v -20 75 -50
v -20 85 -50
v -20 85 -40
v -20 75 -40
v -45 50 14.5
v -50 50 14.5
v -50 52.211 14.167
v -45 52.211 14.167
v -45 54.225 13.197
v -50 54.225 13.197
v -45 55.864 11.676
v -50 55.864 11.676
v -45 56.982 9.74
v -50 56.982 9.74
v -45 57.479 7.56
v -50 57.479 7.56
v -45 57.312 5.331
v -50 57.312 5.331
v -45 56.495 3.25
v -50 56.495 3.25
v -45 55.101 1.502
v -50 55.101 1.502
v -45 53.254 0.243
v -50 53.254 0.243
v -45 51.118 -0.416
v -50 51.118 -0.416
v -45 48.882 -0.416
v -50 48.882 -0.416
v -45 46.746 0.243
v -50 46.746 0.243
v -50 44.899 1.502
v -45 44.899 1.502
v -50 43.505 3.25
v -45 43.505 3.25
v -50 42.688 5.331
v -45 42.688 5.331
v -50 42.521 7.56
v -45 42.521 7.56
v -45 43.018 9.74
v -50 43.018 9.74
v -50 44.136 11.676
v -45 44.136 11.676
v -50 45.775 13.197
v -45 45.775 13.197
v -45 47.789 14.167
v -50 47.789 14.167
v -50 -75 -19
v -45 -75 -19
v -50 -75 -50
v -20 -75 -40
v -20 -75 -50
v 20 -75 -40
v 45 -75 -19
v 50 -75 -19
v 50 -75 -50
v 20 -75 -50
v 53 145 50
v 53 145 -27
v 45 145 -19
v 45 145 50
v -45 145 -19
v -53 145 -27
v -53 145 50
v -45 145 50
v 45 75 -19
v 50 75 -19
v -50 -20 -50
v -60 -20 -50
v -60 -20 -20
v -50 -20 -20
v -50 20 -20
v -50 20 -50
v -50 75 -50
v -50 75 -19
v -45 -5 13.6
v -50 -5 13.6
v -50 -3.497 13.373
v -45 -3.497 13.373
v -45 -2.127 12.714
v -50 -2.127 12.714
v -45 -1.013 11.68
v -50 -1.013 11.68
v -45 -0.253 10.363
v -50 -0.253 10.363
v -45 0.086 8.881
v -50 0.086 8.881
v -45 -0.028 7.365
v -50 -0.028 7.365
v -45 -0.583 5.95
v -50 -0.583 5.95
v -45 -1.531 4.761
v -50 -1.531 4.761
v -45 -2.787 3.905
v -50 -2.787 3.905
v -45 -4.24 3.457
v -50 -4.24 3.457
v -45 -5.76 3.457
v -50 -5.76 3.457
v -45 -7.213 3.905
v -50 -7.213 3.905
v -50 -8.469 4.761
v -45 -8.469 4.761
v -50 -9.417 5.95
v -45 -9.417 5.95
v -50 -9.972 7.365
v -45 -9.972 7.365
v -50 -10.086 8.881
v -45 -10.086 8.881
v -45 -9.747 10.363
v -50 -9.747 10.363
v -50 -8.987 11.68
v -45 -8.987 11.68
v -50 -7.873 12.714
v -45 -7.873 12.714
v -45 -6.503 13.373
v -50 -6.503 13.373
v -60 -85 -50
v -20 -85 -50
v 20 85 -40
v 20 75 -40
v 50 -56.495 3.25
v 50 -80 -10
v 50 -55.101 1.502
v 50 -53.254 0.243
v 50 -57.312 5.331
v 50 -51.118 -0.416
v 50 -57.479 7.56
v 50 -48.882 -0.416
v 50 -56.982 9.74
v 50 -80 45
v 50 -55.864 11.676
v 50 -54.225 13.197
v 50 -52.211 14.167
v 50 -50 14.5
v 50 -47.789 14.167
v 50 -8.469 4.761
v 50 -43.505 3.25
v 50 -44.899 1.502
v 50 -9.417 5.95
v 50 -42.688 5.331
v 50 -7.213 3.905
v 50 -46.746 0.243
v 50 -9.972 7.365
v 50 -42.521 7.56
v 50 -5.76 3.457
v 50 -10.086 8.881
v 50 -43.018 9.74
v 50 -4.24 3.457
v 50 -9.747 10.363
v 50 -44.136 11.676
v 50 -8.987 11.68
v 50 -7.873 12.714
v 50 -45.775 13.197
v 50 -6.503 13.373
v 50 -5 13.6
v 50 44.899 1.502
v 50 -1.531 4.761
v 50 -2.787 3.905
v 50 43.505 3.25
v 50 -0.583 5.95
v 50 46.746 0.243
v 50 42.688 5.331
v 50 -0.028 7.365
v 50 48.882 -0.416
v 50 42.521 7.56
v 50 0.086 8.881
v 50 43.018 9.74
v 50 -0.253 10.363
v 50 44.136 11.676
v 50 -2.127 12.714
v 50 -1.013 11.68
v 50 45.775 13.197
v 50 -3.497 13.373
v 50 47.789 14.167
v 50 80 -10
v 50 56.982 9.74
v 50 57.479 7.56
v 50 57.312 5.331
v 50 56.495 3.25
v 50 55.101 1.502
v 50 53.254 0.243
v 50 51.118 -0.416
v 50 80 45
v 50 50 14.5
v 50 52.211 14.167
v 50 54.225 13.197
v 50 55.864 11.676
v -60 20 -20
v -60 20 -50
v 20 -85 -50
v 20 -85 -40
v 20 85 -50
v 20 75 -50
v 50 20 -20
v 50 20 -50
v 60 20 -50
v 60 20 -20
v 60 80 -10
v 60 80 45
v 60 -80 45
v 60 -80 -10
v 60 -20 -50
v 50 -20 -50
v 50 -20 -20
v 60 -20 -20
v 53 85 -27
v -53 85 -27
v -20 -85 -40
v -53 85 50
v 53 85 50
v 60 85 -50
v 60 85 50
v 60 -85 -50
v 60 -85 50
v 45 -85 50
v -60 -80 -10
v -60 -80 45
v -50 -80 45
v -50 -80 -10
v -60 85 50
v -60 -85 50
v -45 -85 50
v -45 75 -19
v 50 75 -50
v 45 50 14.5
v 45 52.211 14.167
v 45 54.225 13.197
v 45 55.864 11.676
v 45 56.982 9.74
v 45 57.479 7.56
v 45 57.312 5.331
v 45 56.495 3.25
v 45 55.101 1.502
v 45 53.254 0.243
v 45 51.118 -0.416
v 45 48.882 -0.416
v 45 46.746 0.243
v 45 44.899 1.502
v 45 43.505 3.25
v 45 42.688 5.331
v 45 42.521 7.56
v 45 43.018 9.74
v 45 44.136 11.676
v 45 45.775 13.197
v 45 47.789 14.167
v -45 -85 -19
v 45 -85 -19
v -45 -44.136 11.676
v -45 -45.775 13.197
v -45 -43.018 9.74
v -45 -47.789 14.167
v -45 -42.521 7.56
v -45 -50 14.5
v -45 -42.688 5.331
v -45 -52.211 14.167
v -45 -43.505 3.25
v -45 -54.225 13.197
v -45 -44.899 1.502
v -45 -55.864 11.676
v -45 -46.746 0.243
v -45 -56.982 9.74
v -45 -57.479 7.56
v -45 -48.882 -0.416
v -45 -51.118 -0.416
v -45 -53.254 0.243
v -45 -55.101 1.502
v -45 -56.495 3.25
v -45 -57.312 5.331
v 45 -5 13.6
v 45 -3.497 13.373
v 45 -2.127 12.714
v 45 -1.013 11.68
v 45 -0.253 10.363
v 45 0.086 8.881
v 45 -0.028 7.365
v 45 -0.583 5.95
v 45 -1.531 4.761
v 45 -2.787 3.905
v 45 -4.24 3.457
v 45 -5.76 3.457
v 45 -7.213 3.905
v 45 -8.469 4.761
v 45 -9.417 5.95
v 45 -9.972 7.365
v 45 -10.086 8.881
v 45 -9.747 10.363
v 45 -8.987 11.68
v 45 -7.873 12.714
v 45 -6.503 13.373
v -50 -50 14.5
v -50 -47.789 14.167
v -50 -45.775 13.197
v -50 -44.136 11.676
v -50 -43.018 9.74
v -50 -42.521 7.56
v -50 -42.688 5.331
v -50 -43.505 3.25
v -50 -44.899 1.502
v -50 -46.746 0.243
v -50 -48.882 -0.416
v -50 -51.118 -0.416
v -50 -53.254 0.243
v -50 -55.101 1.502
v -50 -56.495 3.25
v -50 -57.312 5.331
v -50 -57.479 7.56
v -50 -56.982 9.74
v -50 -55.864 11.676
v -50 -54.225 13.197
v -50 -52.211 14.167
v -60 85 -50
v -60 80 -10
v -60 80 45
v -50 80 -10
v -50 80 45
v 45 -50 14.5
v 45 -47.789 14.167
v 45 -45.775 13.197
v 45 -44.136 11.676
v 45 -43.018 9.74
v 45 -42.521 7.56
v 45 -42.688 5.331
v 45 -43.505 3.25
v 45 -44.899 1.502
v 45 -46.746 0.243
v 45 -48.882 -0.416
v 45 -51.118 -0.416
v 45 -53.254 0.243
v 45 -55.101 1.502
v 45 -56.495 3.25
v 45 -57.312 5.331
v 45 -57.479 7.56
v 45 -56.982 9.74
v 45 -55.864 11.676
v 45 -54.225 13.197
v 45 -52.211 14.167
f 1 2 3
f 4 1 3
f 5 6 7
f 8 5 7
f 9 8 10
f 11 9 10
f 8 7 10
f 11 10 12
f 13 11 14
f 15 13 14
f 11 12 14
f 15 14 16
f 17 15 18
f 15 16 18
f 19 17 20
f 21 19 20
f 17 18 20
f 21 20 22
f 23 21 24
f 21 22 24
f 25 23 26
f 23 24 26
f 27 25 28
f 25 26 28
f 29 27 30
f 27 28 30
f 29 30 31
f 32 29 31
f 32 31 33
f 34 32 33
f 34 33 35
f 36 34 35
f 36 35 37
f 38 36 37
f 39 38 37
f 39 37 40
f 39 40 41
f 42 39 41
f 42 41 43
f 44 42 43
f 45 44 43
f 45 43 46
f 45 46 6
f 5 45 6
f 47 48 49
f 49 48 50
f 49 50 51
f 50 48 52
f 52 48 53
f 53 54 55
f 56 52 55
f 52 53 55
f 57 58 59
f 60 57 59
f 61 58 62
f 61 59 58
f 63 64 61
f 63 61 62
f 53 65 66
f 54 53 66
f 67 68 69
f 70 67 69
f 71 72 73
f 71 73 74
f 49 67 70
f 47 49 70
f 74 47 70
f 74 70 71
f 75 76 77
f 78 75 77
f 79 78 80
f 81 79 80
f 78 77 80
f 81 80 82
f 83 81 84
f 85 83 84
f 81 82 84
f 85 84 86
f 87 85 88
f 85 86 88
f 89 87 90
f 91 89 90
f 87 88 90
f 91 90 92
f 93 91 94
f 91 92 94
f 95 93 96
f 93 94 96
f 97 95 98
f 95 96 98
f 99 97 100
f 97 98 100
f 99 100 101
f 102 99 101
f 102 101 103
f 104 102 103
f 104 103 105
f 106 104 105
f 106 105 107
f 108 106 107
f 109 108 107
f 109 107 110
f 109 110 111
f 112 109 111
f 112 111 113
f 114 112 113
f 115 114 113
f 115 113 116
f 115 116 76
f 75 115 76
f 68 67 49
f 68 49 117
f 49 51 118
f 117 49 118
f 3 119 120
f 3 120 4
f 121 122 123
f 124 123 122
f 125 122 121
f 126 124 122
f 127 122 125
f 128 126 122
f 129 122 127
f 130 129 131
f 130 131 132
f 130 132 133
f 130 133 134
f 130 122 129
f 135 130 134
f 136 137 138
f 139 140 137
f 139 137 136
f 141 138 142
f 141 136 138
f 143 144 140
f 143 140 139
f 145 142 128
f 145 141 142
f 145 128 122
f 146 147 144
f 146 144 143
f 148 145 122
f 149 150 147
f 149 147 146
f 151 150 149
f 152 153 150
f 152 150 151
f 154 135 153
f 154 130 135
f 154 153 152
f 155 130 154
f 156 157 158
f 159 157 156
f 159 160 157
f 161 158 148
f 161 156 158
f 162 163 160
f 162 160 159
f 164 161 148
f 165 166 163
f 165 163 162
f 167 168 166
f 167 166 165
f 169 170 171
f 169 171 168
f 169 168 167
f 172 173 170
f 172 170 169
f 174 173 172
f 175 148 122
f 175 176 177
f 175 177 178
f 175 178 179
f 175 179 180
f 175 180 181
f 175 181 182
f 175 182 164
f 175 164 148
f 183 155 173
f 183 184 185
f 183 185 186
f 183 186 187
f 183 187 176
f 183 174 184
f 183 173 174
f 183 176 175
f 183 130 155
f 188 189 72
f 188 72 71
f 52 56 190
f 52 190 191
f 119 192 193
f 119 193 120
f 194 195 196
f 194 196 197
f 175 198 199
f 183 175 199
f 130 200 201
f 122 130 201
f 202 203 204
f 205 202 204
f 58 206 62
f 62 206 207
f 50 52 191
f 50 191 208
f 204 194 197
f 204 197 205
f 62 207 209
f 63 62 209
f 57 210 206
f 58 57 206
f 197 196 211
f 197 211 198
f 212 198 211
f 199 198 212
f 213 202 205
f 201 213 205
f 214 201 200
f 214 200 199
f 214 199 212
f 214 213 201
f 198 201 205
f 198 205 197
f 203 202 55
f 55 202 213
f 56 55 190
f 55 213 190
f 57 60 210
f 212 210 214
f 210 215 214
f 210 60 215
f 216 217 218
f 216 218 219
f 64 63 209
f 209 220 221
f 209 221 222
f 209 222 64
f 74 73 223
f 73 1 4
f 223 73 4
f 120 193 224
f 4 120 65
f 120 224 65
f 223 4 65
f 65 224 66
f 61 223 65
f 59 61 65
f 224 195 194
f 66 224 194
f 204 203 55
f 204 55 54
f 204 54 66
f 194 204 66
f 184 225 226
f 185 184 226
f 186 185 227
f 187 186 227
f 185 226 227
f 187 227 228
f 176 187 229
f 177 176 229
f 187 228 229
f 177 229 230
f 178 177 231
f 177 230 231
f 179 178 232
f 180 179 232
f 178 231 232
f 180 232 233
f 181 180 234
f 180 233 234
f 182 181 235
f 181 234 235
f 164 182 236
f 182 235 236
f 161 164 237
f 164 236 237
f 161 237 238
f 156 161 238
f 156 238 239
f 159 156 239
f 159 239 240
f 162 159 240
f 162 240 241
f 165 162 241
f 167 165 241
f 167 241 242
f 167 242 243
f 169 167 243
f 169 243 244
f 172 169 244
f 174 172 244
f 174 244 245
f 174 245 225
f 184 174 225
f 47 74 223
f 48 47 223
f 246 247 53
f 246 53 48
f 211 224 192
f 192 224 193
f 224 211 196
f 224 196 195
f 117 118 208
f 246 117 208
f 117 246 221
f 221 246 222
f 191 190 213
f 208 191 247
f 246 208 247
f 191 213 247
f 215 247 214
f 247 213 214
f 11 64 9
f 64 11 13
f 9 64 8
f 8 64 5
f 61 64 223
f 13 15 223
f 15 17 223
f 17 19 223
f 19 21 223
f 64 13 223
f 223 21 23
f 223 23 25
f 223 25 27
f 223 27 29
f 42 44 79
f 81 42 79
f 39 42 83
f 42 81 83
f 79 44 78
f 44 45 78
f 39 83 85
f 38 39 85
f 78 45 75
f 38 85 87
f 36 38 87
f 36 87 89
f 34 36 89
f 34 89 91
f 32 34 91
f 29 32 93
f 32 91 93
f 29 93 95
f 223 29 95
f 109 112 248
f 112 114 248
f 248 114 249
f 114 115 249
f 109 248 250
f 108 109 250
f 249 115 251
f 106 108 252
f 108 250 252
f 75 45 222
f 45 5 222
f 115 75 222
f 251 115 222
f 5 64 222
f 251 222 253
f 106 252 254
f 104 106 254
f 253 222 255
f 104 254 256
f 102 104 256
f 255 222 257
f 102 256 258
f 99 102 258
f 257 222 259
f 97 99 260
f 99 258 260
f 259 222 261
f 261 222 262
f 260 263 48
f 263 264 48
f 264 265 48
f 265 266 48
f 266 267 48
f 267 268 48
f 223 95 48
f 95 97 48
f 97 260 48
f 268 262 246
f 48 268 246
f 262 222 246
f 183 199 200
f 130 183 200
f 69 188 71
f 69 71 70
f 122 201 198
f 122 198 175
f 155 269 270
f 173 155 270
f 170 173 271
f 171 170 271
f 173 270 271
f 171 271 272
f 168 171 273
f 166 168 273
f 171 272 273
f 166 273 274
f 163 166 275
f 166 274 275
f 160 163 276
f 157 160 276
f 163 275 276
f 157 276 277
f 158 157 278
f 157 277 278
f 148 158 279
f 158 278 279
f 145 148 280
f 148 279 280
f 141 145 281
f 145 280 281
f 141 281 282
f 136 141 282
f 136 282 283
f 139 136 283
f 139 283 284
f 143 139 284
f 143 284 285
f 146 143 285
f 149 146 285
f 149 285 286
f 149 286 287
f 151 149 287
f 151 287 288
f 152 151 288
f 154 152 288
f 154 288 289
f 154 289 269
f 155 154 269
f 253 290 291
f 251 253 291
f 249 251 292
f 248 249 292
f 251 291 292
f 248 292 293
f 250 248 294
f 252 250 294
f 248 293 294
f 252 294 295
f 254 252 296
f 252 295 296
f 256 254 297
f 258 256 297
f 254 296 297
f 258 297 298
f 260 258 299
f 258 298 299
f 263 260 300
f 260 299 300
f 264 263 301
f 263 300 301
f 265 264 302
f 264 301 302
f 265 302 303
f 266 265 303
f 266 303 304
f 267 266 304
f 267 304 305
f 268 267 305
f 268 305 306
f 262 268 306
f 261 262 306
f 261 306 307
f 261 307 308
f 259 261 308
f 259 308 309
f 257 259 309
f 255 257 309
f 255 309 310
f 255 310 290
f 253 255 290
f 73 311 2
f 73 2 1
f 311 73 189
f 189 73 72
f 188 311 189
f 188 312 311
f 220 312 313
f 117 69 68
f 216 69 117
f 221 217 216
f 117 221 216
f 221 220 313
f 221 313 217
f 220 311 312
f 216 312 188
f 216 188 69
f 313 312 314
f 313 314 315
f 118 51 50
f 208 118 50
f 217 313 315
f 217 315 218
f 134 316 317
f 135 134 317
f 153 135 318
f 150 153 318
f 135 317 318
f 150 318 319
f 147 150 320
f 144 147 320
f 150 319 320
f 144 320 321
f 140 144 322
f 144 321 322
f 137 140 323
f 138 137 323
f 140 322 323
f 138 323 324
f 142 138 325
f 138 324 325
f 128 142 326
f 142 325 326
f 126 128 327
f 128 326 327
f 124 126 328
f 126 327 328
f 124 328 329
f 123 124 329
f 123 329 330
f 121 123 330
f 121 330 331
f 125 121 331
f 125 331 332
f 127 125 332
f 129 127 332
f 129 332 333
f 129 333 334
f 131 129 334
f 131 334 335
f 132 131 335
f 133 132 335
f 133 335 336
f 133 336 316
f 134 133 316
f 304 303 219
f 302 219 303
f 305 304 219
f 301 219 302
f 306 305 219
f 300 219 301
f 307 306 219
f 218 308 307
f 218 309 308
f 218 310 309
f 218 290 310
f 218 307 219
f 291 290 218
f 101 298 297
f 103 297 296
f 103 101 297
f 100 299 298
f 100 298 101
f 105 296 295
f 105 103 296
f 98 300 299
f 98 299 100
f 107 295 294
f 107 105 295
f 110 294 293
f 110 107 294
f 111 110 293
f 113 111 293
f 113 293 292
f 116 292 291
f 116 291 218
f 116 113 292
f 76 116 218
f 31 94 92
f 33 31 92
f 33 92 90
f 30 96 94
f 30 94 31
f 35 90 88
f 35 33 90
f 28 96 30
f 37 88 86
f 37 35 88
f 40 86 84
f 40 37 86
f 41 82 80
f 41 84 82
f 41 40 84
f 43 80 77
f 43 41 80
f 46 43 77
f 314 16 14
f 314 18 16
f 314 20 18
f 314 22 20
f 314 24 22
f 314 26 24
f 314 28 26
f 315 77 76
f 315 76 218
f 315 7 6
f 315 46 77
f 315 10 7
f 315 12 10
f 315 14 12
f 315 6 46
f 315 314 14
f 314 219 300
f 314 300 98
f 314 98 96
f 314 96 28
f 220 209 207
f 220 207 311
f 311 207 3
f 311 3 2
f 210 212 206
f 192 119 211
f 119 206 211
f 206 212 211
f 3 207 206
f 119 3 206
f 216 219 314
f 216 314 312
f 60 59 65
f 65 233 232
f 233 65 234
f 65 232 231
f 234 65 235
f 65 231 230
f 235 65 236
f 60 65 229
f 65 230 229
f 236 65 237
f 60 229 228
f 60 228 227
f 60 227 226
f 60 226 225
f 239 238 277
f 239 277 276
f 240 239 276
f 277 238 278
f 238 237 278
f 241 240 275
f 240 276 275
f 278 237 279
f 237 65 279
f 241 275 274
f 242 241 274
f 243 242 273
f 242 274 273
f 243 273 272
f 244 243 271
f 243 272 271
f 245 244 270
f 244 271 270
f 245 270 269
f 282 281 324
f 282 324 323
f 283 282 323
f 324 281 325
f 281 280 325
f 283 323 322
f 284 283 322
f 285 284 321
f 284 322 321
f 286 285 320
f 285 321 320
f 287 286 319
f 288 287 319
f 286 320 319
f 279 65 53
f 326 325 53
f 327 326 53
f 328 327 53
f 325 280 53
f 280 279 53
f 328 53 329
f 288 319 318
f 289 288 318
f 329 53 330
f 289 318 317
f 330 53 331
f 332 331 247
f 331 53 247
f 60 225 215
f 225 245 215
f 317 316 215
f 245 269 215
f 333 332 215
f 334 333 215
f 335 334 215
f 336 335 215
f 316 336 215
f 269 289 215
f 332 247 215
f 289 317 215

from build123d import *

# Parameters (mm, degrees)
BOSS_EXTRUDE1_DEPTH     = 60
CUT_EXTRUDE2_DEPTH      = 10
SKETCH4_R               = 1.5
CUT_EXTRUDE3_DEPTH      = 145.308696897
CUT_EXTRUDE4_DEPTH      = 188.082869339
CUT_EXTRUDE4_DEPTH_BACK = 188.082869339
SKETCH6_W               = 5
SKETCH6_H               = 59
BOSS_EXTRUDE2_DEPTH     = 150
SKETCH7_R               = 7.5
SKETCH7_R_2             = 5.1
CUT_EXTRUDE5_DEPTH      = 148.732867027
SKETCH9_W               = 40
SKETCH9_H               = 10
CUT_EXTRUDE6_DEPTH      = 188.082869339
SKETCH11_W              = 10
SKETCH11_H              = 40
BOSS_EXTRUDE6_DEPTH     = 160
SKETCH13_W              = 40
SKETCH13_H              = 30
CUT_EXTRUDE7_DEPTH      = 156.32224567
BOSS_EXTRUDE7_DEPTH     = 60


with BuildPart() as part:
    # Sketch1 → Boss-Extrude1 (new, symmetric)
    with BuildSketch(Plane.YZ):
        Polygon((85, 50), (85, -50), (75, -50), (75, 40), (-75, 40), (-75, -50), (-85, -50), (-85, 50), align=None)
    extrude(amount=BOSS_EXTRUDE1_DEPTH, both=True)

    # Sketch3 → Cut-Extrude2 (cut)
    with BuildSketch(Plane.YZ.offset(60)):
        Polygon((-80, 45), (-80, -50), (-75, -50), (-75, 40), (75, 40), (75, -50), (80, -50), (80, 45), align=None)
    cut_extrude2 = extrude(amount=-CUT_EXTRUDE2_DEPTH, mode=Mode.SUBTRACT)

    # Mirror1: Cut-Extrude2 across plane
    add(cut_extrude2.mirror(Plane(origin=(0, 0, 0), x_dir=(0, 0, 1), z_dir=(1, 0, 0))), mode=Mode.SUBTRACT)

    # Sketch4 → Cut-Extrude3 (cut, through all)
    with BuildSketch(Plane.XY.offset(50)):
        with Locations((-35, 0)):
            Circle(SKETCH4_R)
        with Locations((35, 0)):
            Circle(SKETCH4_R)
        with Locations((-35, 60)):
            Circle(SKETCH4_R)
        with Locations((35, 60)):
            Circle(SKETCH4_R)
    extrude(amount=-CUT_EXTRUDE3_DEPTH, mode=Mode.SUBTRACT)

    # Sketch5 → Cut-Extrude4 (cut, two sides: drawn at the far end of the back side and taken through both)
    with BuildSketch(Plane(origin=(0, 85, 0), x_dir=(-1, 0, 0), z_dir=(0, 1, 0)).offset(-CUT_EXTRUDE4_DEPTH_BACK)):
        Polygon((45, 50), (-45, 50), (-45, -19), (20, -19), (45, -19), align=None)
    extrude(amount=CUT_EXTRUDE4_DEPTH + CUT_EXTRUDE4_DEPTH_BACK, mode=Mode.SUBTRACT)

    # Sketch6 → Boss-Extrude2 (add)
    with BuildSketch(Plane.XZ.offset(-75)):
        with Locations((-47.5, 10.5)):
            Rectangle(SKETCH6_W, SKETCH6_H)
        with Locations((47.5, 10.5)):
            Rectangle(SKETCH6_W, SKETCH6_H)
    extrude(amount=BOSS_EXTRUDE2_DEPTH)

    # Sketch7 → Cut-Extrude5 (cut, through all)
    with BuildSketch(Plane(origin=(-50, 0, 0), x_dir=(0, -1, 0), z_dir=(-1, 0, 0))):
        with Locations(Location((-50, 7, 0), (0, 0, 90))):
            Circle(SKETCH7_R)
        with Locations(Location((5, 8.5, 0), (0, 0, 90))):
            Circle(SKETCH7_R_2)
        with Locations(Location((50, 7, 0), (0, 0, 90))):
            Circle(SKETCH7_R)
    extrude(amount=-CUT_EXTRUDE5_DEPTH, mode=Mode.SUBTRACT)

    # Sketch9 → Cut-Extrude6 (cut, through all)
    with BuildSketch(Plane(origin=(0, 85, 0), x_dir=(-1, 0, 0), z_dir=(0, 1, 0))):
        with Locations((0, -45)):
            Rectangle(SKETCH9_W, SKETCH9_H)
    extrude(amount=-CUT_EXTRUDE6_DEPTH, mode=Mode.SUBTRACT)

    # Sketch11 → Boss-Extrude6 (add)
    with BuildSketch(Plane(origin=(0, -80, 0), x_dir=(-1, 0, 0), z_dir=(0, 1, 0))):
        with Locations((-55, -30)):
            Rectangle(SKETCH11_W, SKETCH11_H)
        with Locations((55, -30)):
            Rectangle(SKETCH11_W, SKETCH11_H)
    extrude(amount=BOSS_EXTRUDE6_DEPTH)

    # Sketch13 → Cut-Extrude7 (cut, through all)
    with BuildSketch(Plane(origin=(-60, 0, 0), x_dir=(0, -1, 0), z_dir=(-1, 0, 0))):
        with Locations((0, -35)):
            Rectangle(SKETCH13_W, SKETCH13_H)
    extrude(amount=-CUT_EXTRUDE7_DEPTH, mode=Mode.SUBTRACT)

    # Sketch14 → Boss-Extrude7 (add)
    with BuildSketch(Plane(origin=(0, 85, 0), x_dir=(-1, 0, 0), z_dir=(0, 1, 0))):
        Polygon((-45, 50), (-53, 50), (-53, -27), (-44.583399228, -27), (53, -27), (53, -19), (53, 50), (45, 50), (45, -19), (-45, -19), align=None)
    extrude(amount=BOSS_EXTRUDE7_DEPTH)


solid = part.part
